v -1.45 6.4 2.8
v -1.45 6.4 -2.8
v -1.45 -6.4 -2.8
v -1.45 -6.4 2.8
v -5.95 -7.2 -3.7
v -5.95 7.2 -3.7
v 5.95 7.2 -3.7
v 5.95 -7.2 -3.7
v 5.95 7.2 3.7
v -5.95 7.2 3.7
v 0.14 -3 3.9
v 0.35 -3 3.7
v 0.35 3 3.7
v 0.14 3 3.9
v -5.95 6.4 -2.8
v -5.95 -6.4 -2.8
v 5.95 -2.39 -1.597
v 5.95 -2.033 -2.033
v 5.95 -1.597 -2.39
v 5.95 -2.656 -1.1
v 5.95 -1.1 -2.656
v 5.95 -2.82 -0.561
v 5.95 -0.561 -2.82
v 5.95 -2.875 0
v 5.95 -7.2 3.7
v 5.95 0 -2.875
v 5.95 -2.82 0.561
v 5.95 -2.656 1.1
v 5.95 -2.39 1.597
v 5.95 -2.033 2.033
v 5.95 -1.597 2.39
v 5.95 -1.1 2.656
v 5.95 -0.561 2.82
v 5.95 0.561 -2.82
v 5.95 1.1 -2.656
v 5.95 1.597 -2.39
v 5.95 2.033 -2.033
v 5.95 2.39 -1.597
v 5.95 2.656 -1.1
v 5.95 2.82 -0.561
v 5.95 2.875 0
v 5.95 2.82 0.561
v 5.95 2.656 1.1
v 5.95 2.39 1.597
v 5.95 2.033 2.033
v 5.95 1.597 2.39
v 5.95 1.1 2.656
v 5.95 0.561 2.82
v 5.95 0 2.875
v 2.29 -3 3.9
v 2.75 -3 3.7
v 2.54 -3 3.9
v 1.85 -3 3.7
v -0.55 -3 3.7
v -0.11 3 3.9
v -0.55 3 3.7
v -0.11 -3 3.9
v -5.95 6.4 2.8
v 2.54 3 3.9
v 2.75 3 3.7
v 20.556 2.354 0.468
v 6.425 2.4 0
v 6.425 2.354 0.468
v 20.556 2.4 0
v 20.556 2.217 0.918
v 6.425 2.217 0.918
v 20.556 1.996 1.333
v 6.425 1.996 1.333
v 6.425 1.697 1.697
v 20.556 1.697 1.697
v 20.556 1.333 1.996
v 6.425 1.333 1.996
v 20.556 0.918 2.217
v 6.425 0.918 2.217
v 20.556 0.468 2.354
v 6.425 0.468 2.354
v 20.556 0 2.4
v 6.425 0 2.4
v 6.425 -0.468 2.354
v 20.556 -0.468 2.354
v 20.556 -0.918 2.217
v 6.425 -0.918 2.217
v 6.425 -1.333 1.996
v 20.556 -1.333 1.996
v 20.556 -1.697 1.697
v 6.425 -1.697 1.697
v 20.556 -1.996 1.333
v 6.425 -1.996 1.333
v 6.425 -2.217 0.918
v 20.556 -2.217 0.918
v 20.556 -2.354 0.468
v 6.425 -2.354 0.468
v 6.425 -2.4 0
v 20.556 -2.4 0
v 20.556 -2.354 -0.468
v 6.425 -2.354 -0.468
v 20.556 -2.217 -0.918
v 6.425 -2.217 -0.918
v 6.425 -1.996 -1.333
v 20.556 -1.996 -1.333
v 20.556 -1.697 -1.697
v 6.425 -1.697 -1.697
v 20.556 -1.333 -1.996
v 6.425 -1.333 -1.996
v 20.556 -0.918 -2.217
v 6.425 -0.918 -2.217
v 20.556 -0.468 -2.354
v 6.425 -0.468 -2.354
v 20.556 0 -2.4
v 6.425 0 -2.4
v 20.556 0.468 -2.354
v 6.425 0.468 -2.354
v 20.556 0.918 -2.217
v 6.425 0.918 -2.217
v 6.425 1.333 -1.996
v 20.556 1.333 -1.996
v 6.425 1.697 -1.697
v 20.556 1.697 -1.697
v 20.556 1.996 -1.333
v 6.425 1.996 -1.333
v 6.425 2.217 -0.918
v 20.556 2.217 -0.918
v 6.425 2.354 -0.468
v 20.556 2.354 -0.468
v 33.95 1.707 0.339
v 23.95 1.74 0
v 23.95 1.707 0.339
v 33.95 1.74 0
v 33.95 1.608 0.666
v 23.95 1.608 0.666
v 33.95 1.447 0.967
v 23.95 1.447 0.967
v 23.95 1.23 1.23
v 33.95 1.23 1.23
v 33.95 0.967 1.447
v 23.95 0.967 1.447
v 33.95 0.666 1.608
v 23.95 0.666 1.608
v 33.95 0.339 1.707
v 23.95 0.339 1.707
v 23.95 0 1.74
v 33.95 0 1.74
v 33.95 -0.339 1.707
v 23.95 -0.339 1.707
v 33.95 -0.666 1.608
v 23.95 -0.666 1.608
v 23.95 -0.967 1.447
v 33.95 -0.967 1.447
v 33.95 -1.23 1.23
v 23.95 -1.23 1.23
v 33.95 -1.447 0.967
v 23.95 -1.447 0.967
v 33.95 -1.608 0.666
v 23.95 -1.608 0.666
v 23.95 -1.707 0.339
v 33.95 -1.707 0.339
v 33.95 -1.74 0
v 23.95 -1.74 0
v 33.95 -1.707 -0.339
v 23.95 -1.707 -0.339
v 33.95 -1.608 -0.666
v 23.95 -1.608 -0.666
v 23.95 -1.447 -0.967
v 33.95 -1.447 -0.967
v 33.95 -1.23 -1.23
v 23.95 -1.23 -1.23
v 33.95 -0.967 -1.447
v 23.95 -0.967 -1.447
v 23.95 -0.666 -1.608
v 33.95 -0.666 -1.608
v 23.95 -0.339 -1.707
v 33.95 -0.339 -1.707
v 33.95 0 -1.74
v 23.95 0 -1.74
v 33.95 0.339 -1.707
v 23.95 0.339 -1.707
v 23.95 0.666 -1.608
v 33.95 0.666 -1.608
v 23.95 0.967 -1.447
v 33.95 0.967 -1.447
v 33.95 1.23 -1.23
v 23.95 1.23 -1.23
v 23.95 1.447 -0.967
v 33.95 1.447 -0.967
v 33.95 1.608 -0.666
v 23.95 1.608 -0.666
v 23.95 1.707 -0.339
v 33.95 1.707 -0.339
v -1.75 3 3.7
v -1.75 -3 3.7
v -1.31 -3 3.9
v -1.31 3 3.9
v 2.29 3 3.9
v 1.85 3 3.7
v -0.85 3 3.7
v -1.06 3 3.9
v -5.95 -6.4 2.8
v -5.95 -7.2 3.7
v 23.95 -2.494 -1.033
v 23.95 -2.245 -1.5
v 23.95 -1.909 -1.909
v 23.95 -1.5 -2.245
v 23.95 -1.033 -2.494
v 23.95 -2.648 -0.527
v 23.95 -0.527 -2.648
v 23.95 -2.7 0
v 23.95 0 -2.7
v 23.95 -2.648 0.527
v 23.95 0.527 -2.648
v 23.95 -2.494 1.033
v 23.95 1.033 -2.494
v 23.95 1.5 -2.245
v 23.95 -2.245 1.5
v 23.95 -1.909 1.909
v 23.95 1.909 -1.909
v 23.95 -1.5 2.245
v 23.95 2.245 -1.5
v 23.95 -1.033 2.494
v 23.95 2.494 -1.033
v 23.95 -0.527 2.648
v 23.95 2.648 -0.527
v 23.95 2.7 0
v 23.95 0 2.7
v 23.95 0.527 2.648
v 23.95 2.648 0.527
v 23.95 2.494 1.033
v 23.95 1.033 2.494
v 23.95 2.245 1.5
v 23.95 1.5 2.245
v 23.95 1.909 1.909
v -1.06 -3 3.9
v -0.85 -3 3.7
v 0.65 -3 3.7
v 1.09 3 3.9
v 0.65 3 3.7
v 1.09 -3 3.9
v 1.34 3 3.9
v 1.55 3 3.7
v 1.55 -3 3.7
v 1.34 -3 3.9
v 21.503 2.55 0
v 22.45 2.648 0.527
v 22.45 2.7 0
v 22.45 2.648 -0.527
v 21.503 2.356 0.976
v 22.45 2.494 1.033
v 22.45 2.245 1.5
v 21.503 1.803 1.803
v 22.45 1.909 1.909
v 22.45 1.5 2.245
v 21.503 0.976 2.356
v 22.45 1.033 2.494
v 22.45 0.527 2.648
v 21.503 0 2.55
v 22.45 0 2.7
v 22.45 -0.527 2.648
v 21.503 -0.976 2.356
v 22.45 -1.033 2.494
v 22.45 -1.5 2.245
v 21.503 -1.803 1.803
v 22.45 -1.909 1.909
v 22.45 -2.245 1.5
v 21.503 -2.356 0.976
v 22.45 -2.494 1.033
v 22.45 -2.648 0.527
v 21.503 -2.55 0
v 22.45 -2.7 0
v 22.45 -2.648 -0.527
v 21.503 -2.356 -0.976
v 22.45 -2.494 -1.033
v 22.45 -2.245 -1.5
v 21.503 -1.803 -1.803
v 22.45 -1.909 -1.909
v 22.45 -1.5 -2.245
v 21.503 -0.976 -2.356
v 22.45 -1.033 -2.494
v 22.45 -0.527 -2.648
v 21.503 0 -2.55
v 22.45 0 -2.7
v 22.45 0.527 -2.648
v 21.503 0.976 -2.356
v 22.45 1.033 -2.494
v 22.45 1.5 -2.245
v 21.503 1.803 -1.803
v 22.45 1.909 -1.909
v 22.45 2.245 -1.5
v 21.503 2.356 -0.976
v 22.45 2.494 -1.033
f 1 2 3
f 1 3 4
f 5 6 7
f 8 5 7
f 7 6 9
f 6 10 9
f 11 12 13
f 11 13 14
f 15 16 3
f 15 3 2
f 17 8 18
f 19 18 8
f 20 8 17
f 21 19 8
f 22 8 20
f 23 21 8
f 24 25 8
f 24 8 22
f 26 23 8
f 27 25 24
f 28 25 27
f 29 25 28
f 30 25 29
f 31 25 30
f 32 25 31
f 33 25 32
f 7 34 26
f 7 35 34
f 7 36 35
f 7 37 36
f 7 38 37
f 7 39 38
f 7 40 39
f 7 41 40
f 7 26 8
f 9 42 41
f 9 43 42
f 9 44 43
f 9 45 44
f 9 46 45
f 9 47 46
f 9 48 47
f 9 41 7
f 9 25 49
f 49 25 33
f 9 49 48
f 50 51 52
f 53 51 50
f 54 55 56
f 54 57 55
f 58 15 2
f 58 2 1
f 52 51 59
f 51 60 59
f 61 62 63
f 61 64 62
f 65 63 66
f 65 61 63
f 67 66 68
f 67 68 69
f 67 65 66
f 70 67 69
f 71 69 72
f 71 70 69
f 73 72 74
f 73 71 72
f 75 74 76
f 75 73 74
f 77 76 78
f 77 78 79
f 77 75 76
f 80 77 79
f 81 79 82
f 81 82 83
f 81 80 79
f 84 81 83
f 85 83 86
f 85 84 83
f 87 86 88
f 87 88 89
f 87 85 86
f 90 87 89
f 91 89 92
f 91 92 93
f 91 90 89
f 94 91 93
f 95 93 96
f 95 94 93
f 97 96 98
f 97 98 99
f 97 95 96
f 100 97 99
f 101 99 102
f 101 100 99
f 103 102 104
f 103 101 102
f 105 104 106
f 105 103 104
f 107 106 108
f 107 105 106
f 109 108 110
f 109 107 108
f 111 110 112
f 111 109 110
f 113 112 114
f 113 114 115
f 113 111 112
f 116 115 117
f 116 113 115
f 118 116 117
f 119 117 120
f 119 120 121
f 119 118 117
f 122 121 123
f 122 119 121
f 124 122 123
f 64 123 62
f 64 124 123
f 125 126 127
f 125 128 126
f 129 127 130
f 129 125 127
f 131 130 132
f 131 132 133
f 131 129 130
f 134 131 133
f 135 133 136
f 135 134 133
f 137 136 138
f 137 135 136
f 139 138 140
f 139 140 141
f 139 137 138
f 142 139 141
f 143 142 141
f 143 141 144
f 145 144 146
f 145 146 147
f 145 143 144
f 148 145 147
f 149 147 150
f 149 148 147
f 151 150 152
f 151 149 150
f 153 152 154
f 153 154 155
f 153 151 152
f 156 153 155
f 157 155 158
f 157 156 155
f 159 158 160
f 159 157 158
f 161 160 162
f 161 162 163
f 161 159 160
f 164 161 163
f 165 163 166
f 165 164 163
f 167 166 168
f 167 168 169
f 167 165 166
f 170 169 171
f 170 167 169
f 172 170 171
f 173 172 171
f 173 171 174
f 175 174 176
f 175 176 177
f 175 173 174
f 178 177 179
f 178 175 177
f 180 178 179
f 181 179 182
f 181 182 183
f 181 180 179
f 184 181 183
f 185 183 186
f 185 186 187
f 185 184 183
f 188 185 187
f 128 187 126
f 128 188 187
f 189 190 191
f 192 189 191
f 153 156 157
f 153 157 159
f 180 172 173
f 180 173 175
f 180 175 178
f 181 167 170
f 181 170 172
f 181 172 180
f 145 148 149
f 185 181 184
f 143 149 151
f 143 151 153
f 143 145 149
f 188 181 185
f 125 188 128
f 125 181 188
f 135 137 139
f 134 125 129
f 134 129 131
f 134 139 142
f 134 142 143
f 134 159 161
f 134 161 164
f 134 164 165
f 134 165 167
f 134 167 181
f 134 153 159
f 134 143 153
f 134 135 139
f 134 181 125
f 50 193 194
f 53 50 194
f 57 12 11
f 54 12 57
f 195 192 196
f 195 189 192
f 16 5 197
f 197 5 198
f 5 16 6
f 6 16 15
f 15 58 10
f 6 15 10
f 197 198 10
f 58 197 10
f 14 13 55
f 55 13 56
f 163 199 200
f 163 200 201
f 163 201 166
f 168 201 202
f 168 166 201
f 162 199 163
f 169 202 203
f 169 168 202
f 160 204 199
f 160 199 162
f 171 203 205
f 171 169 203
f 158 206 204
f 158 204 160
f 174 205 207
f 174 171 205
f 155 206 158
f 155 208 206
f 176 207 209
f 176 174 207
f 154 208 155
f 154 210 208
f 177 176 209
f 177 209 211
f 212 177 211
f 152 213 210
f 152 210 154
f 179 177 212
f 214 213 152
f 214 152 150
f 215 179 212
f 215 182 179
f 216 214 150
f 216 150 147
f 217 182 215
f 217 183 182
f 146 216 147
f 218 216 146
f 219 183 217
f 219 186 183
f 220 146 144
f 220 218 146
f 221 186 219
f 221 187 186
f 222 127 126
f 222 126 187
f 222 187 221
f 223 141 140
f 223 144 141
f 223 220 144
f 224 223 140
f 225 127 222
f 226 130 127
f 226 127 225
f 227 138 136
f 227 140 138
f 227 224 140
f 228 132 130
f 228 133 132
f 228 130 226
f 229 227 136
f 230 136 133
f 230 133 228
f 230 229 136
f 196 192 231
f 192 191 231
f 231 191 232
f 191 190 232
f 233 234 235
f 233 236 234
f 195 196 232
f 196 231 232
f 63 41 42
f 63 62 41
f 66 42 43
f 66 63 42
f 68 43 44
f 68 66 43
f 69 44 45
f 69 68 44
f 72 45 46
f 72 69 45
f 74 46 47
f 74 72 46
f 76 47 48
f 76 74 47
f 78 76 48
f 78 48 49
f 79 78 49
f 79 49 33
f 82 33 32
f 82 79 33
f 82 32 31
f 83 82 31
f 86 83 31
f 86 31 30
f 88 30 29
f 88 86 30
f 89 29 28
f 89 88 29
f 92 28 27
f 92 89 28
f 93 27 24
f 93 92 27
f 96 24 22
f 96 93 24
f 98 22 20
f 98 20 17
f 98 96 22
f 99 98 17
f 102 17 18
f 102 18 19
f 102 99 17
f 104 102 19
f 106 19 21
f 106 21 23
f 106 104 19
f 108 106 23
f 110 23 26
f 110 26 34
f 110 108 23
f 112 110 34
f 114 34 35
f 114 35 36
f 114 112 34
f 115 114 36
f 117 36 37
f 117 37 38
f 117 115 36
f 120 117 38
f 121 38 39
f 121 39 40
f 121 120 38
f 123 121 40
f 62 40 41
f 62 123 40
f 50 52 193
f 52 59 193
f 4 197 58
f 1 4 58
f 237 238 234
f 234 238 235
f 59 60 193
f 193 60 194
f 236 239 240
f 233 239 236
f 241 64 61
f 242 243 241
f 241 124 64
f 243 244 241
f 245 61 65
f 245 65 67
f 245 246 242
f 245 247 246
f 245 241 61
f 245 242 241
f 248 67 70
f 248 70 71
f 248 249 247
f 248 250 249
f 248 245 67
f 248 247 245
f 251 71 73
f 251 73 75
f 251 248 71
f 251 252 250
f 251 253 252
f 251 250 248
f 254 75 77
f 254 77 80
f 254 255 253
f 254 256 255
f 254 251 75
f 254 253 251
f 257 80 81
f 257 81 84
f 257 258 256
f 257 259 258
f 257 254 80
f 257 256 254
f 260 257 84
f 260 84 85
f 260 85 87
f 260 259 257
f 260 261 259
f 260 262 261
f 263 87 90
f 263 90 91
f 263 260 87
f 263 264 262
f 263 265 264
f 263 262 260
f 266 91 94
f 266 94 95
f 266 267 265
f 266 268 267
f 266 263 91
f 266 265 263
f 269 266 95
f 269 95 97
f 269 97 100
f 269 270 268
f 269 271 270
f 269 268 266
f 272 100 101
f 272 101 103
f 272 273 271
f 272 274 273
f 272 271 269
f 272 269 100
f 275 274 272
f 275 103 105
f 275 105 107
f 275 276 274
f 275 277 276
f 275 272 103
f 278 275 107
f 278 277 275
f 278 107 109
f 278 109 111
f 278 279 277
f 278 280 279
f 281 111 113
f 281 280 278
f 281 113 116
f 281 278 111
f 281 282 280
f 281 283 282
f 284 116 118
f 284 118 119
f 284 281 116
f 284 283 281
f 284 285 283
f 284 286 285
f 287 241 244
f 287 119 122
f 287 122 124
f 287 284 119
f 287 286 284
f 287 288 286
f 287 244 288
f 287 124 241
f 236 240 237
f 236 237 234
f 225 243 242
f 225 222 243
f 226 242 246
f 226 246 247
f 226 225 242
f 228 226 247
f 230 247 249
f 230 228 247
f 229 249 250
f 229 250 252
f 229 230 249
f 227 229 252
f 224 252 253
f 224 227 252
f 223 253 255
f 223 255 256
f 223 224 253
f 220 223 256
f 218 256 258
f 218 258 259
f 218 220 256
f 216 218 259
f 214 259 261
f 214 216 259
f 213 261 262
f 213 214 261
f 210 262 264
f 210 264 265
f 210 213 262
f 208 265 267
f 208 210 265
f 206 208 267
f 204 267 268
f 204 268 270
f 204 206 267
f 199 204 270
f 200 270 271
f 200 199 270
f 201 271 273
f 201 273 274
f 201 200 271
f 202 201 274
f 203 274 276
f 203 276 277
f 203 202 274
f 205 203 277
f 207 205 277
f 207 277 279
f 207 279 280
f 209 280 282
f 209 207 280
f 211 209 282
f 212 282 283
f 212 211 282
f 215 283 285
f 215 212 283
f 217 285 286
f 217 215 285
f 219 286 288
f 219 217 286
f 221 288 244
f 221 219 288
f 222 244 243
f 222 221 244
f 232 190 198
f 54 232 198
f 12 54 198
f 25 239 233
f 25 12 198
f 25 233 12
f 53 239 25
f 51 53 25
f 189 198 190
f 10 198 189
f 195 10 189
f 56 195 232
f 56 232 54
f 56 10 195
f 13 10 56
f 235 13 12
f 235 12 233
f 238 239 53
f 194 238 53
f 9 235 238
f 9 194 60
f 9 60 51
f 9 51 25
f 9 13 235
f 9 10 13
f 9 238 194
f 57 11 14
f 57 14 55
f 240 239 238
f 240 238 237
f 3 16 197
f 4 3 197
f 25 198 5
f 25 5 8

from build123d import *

# Parameters (mm, degrees)
SKETCH1_W      = 11.9
SKETCH1_H      = 14.4
EXTRUDE1_DEPTH = 3.7
EXTRUDE2_DEPTH = 3
SKETCH4_W      = 5.6
SKETCH4_H      = 12.8
EXTRUDE3_DEPTH = 4.5


with BuildPart() as part:
    # Sketch1 → Extrude1 (new body, symmetric)
    with BuildSketch(Plane.XY):
        Rectangle(SKETCH1_W, SKETCH1_H)
    extrude(amount=EXTRUDE1_DEPTH, both=True)

    # Sketch2 → Revolve1 (revolve)
    with BuildSketch(Plane.XY):
        Polygon((5.95, 0), (5.95, 2.875), (6.425, 2.4), (20.555874546, 2.4), (22.45, 2.7), (23.95, 2.7), (23.95, 1.74), (33.95, 1.74), (33.95, 0), align=None)
    revolve(axis=Axis((0, 0, 0), (1, 0, 0)))

    # Sketch3 → Extrude2 (add, symmetric)
    with BuildSketch(Plane(origin=(0, 0, 0), x_dir=(1, 0, 0), z_dir=(0, 1, 0))):
        Polygon((-1.75, -3.7), (-1.31, -3.9), (-1.06, -3.9), (-0.85, -3.7), align=None)
        Polygon((-0.55, -3.7), (0.35, -3.7), (0.14, -3.9), (-0.11, -3.9), align=None)
        Polygon((0.65, -3.7), (1.55, -3.7), (1.34, -3.9), (1.09, -3.9), align=None)
        Polygon((1.85, -3.7), (2.75, -3.7), (2.54, -3.9), (2.29, -3.9), align=None)
    extrude(amount=EXTRUDE2_DEPTH, both=True)

    # Sketch4 → Extrude3 (cut)
    with BuildSketch(Plane.ZY.offset(5.95)):
        Rectangle(SKETCH4_W, SKETCH4_H)
    extrude(amount=-EXTRUDE3_DEPTH, mode=Mode.SUBTRACT)


solid = part.part
